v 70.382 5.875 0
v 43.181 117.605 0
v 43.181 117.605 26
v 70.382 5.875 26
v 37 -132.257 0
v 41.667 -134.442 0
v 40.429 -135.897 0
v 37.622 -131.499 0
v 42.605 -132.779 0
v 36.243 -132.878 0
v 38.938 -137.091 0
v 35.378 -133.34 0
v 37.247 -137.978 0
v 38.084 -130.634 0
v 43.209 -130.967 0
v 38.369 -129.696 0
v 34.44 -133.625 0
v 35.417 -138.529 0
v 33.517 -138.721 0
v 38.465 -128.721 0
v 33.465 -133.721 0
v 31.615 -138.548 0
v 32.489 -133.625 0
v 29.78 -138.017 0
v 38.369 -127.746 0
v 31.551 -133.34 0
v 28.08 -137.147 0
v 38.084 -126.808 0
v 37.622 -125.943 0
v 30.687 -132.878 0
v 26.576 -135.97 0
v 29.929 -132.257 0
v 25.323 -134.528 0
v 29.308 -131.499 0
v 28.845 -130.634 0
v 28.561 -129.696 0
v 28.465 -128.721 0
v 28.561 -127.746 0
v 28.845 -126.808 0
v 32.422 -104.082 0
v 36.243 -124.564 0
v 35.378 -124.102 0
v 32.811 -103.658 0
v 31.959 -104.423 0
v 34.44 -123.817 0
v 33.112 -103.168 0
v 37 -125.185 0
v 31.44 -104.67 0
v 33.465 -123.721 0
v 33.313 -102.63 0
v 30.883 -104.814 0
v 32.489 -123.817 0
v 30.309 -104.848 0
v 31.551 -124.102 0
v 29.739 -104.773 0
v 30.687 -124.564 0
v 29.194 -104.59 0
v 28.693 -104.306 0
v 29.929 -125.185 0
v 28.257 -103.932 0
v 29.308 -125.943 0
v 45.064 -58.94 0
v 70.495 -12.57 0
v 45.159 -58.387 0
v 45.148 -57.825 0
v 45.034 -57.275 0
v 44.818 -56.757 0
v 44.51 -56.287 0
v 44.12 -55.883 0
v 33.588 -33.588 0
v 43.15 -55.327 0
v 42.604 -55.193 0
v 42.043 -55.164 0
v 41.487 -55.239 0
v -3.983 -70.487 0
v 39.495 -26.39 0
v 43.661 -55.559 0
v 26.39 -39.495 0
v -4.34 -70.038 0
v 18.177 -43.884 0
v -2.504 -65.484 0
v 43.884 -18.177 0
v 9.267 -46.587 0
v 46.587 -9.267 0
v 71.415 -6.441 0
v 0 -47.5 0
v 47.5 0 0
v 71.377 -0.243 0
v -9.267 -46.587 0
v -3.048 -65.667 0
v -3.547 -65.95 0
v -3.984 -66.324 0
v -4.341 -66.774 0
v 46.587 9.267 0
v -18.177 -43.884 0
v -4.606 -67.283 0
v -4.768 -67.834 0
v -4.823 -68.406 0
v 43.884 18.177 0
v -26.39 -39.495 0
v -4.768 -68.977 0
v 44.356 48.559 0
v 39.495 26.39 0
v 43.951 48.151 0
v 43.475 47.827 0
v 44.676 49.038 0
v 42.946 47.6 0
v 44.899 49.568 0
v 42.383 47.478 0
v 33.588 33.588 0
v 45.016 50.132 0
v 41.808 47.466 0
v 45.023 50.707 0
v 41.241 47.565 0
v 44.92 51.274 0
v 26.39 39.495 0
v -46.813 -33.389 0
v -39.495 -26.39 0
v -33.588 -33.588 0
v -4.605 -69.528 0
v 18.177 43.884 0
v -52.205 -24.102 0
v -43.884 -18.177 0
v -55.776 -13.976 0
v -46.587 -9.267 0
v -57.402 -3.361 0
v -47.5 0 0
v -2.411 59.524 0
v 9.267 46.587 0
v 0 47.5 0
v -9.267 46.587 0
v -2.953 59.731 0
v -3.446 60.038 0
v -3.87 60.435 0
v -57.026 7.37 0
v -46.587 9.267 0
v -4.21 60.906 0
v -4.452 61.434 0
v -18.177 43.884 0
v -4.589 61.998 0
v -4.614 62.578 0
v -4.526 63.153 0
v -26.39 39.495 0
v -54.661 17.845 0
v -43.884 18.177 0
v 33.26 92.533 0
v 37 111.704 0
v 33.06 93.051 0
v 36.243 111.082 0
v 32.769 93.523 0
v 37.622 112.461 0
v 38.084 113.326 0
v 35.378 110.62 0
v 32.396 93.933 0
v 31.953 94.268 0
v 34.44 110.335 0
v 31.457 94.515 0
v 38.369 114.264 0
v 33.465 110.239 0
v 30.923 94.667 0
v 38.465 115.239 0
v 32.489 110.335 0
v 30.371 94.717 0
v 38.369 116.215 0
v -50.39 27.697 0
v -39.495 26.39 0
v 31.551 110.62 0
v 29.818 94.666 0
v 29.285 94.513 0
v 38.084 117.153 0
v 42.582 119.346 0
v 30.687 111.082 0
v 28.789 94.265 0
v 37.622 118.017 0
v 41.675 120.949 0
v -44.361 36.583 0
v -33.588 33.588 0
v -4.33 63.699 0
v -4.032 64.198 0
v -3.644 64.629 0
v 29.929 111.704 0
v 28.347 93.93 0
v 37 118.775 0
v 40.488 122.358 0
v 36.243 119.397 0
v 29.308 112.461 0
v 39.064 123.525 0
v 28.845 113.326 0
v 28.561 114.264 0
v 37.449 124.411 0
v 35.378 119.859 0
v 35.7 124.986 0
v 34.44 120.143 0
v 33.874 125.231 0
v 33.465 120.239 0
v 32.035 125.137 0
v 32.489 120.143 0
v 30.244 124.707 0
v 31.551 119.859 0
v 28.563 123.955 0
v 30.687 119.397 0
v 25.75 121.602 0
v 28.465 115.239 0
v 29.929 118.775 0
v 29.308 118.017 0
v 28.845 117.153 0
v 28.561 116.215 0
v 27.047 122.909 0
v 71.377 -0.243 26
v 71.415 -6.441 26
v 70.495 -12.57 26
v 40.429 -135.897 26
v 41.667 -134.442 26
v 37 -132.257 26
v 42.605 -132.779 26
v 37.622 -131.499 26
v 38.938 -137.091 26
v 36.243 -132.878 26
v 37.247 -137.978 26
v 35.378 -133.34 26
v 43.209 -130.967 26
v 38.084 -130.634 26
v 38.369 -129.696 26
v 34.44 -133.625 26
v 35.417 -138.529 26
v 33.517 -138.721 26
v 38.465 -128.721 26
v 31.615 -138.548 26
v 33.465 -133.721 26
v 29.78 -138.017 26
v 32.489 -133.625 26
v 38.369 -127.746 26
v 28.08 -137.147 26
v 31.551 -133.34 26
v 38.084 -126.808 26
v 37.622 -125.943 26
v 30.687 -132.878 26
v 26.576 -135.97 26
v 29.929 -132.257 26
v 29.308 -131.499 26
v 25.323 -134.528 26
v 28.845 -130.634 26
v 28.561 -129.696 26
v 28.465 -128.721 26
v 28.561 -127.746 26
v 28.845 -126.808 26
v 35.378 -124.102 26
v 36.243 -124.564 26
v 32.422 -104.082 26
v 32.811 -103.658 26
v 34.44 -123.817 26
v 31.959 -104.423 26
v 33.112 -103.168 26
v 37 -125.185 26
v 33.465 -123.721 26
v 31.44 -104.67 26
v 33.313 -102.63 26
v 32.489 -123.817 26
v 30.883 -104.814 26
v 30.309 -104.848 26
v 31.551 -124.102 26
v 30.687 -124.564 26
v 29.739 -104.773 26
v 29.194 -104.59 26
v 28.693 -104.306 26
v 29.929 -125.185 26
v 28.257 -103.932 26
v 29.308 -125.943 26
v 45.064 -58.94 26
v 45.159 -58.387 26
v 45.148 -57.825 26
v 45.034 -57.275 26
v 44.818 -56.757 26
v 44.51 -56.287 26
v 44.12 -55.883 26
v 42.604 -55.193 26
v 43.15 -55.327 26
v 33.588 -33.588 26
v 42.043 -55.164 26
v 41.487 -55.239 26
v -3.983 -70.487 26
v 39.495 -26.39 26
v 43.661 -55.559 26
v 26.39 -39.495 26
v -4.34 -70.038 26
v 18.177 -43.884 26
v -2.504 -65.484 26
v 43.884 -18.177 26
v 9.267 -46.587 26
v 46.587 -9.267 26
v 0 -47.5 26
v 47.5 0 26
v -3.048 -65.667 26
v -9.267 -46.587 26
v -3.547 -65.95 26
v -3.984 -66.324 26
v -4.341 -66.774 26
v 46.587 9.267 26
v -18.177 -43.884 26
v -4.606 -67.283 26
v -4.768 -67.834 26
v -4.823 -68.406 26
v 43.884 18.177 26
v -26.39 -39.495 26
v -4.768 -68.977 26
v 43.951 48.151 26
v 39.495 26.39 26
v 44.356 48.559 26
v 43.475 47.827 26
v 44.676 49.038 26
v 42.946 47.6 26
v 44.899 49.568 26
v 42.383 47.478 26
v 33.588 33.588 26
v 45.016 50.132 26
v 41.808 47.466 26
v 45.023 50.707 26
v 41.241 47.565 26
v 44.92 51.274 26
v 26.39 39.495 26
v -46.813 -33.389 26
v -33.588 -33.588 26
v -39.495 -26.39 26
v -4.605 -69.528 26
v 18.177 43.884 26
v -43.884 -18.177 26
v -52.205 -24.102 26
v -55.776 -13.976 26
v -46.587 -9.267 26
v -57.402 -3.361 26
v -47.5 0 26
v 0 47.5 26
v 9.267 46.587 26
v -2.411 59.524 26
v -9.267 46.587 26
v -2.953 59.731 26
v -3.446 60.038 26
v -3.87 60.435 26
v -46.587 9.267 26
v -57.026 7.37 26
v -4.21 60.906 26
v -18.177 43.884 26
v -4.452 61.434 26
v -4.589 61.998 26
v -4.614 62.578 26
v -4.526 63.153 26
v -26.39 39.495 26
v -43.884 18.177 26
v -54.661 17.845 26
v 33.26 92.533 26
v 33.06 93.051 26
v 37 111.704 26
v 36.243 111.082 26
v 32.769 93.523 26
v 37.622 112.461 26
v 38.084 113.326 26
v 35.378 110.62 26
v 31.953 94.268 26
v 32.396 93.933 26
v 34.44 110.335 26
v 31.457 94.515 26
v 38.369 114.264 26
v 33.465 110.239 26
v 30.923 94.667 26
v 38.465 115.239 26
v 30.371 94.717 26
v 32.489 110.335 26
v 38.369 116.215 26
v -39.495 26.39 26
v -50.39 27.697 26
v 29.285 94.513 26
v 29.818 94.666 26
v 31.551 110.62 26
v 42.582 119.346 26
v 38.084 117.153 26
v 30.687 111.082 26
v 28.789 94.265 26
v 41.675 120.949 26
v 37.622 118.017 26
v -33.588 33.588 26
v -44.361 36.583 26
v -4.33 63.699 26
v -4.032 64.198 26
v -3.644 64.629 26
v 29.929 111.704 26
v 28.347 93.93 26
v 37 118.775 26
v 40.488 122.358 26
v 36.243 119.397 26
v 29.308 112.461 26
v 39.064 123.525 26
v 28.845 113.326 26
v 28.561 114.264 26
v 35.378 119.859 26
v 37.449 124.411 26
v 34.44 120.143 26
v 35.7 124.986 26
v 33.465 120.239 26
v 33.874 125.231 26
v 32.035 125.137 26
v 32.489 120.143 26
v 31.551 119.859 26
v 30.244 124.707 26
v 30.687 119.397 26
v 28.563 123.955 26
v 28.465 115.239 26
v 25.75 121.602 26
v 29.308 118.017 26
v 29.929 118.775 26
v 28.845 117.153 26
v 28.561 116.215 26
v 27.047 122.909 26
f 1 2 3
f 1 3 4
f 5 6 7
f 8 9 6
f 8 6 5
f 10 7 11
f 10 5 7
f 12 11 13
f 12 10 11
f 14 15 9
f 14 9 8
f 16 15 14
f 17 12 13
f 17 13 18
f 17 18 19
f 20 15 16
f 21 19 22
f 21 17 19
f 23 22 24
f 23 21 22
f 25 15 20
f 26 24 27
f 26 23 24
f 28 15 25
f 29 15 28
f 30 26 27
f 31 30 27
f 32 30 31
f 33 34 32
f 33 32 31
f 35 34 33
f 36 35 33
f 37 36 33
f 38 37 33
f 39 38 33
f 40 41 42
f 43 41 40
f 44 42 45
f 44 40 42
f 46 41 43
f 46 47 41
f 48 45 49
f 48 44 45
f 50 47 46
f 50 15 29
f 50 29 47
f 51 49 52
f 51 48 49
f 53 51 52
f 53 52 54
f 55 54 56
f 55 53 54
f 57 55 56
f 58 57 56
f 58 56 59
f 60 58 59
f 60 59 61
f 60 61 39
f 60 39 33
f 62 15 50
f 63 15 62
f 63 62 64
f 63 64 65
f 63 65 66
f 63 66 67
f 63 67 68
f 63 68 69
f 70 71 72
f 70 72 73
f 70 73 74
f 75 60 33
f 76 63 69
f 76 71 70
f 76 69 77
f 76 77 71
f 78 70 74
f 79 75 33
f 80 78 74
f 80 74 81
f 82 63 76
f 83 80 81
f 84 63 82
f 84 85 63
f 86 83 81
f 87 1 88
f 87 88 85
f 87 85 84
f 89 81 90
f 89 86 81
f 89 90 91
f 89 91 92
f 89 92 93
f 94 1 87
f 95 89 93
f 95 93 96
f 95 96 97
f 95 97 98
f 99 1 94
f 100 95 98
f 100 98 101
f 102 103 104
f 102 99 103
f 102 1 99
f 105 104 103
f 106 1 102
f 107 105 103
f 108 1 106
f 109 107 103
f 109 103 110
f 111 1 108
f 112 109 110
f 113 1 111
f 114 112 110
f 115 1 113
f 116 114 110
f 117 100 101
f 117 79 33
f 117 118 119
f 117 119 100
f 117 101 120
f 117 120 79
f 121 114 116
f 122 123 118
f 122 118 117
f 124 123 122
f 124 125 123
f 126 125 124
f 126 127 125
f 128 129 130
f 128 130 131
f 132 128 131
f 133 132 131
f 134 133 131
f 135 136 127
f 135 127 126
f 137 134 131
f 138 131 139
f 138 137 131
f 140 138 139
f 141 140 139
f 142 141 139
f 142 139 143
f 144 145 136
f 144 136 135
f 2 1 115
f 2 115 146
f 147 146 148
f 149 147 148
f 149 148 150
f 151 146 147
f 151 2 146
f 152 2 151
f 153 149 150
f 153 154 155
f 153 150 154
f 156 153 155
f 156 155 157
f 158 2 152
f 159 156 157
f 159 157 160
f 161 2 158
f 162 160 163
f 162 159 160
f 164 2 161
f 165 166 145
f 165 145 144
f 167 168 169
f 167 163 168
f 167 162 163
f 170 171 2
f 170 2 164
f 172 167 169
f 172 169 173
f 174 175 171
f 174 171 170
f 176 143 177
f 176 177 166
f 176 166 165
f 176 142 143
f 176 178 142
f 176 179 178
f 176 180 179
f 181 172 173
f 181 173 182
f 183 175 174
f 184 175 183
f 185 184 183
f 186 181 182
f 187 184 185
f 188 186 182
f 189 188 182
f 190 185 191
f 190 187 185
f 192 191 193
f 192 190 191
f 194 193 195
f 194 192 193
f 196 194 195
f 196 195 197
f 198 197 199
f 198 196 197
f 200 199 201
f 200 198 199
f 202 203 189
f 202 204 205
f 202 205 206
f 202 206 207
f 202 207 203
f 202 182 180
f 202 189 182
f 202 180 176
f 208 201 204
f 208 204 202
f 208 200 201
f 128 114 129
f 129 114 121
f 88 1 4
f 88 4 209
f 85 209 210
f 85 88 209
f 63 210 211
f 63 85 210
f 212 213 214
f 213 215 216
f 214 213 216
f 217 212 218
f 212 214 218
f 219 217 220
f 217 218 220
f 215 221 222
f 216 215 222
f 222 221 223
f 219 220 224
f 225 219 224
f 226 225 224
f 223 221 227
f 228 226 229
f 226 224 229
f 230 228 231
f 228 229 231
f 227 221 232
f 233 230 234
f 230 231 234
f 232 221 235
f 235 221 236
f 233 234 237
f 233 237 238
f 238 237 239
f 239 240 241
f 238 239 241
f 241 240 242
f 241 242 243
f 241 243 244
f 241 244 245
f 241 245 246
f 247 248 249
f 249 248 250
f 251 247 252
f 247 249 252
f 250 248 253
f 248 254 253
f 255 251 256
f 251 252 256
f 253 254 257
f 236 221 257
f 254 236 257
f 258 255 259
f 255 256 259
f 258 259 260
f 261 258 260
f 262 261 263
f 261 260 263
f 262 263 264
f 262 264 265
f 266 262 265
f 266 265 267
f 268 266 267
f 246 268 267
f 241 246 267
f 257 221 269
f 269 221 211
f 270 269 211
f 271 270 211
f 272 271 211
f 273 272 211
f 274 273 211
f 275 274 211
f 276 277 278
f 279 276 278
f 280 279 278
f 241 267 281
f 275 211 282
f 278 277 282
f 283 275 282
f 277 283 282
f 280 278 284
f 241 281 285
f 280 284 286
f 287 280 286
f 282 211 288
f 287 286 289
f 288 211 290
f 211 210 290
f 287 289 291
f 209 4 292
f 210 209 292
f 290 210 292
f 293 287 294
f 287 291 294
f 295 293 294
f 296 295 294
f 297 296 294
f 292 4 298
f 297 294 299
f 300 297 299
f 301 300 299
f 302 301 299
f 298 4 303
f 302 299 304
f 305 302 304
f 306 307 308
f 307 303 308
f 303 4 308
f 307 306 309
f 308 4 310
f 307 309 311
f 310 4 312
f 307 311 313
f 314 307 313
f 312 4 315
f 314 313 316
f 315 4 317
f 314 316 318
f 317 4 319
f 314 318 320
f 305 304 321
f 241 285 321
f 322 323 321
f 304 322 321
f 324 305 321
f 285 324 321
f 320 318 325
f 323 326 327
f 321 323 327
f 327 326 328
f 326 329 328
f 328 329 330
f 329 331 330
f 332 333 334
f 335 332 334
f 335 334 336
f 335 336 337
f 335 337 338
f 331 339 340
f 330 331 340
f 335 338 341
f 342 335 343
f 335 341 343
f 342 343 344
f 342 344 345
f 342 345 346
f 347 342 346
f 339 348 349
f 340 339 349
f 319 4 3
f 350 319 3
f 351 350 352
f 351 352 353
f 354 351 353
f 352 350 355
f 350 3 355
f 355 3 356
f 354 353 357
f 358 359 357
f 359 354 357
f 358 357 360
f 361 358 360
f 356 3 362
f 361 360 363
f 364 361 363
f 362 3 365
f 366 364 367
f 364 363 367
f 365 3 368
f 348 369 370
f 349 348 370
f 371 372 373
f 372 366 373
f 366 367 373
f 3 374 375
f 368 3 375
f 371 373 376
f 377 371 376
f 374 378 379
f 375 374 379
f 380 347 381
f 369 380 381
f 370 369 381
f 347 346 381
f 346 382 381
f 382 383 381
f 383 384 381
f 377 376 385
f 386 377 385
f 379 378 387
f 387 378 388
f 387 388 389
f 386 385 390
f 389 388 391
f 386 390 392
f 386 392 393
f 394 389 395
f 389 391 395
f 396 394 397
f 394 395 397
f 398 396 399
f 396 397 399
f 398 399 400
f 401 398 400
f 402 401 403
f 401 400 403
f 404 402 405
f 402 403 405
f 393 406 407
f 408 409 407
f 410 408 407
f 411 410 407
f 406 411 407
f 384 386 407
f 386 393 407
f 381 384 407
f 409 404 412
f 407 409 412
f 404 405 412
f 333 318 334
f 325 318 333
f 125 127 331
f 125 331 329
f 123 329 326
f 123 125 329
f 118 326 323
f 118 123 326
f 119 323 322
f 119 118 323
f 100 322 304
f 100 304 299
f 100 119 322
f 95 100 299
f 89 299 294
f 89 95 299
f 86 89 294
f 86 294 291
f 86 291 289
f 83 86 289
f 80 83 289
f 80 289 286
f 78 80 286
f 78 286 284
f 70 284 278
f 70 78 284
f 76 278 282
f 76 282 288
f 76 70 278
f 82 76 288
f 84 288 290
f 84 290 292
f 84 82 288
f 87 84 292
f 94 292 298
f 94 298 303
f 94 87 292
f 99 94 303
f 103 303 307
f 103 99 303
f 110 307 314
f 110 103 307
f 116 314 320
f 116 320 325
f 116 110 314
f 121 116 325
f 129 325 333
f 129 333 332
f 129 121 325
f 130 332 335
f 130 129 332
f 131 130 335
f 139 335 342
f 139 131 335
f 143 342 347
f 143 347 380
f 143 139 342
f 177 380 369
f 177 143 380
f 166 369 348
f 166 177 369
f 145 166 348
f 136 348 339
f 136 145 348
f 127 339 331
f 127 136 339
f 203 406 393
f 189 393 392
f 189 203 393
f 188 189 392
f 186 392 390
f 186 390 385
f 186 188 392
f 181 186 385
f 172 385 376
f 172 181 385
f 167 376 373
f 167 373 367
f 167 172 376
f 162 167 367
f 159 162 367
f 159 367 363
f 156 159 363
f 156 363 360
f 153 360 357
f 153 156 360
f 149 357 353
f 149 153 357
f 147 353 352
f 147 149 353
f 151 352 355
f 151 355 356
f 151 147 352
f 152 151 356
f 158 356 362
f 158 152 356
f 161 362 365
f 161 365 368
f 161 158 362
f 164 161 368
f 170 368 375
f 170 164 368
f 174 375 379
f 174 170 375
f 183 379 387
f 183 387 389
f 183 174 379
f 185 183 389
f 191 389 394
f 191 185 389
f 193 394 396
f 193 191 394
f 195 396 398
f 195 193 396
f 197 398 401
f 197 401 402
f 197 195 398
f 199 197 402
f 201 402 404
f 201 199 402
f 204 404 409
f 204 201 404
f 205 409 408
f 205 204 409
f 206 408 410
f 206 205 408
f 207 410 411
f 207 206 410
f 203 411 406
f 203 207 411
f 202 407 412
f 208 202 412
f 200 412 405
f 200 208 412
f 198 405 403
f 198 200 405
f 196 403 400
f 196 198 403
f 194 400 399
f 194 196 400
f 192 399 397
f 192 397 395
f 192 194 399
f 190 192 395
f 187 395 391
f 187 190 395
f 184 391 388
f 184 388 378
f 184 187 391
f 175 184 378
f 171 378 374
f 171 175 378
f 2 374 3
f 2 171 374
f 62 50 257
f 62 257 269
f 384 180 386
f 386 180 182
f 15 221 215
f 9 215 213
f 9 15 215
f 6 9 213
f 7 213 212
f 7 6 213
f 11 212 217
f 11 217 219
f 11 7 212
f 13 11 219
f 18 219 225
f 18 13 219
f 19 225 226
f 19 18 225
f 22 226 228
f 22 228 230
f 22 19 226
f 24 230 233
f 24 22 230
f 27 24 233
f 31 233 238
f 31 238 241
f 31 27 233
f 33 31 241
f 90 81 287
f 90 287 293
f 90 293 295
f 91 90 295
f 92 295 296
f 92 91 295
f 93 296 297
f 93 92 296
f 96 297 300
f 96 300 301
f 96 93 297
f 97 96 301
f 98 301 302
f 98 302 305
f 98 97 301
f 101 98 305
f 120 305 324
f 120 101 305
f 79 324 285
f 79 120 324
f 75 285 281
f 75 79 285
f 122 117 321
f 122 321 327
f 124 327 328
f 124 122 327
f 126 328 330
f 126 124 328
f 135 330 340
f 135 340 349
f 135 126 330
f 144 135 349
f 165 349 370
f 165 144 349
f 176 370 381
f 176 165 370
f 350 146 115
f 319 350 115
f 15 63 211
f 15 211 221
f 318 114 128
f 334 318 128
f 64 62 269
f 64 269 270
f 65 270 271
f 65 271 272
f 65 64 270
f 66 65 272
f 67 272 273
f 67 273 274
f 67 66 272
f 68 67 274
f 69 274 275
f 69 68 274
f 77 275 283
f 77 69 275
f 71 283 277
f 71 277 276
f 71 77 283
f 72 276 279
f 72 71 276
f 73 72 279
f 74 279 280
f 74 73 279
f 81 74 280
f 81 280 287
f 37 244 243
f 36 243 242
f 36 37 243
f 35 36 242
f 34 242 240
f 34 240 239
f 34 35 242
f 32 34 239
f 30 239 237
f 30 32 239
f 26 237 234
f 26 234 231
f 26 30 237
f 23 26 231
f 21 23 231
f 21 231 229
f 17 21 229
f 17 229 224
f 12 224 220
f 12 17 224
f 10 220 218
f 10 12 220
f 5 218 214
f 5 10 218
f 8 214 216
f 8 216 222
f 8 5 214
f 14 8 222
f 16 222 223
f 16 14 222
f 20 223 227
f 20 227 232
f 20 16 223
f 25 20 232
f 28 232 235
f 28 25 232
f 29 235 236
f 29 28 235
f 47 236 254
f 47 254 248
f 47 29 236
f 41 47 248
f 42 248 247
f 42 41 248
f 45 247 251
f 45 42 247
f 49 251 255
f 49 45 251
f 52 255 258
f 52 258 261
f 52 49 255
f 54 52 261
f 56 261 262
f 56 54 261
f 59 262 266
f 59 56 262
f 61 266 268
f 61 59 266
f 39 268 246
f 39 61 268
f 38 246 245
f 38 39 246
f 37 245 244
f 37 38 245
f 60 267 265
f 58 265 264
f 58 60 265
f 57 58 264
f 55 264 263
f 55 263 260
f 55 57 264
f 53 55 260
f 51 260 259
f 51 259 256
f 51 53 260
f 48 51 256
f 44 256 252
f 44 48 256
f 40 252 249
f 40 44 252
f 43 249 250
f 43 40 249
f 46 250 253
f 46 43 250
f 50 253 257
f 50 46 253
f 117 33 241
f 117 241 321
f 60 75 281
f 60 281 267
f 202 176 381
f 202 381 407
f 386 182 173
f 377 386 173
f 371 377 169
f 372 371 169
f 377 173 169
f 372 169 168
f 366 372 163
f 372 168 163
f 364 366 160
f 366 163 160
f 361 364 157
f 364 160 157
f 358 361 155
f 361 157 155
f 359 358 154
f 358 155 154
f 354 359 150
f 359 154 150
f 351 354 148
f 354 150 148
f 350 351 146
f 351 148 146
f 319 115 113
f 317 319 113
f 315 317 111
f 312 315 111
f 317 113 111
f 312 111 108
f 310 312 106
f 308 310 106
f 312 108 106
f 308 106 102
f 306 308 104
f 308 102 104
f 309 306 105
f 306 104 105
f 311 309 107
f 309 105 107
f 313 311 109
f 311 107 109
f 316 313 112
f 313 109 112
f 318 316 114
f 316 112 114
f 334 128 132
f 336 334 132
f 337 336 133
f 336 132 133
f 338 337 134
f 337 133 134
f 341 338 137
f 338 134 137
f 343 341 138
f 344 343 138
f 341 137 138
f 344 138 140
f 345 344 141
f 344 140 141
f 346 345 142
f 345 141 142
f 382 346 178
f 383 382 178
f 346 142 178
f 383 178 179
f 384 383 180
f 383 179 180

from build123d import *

# Parameters (mm, degrees)
SKETCH2_R           = 47.5
SKETCH2_R_2         = 5
BOSS_EXTRUDE2_DEPTH = 26
CUT_EXTRUDE1_DEPTH  = 26


with BuildPart() as part:
    # Sketch2 → Boss-Extrude2 (new body)
    with BuildSketch(Plane.XY):
        with BuildLine():
            Line((-44.361418341, 36.582981874), (25.749824557, 121.601589362))
            ThreePointArc((25.749824557, 121.601589362), (35.699764064, 124.986391522), (43.181062365, 117.604768557))
            Line((43.181062365, 117.604768557), (70.382008245, 5.874854744))
            ThreePointArc((70.382008245, 5.874854744), (71.516417726, -3.340902868), (70.495441136, -12.569915818))
            Line((70.495441136, -12.569915818), (43.209420588, -130.966785703))
            ThreePointArc((43.209420588, -130.966785703), (35.417472002, -138.528541499), (25.323491774, -134.527769491))
            Line((25.323491774, -134.527769491), (-46.812831844, -33.388752219))
            ThreePointArc((-46.812831844, -33.388752219), (-57.464744559, 2.013239383), (-44.361418341, 36.582981874))
        make_face()
        with Locations(Location((0, 0, 0), (0, 0, 180))):
            Circle(SKETCH2_R, mode=Mode.SUBTRACT)
        with Locations(Location((33.464853834, 115.239331644, 0), (0, 0, 180))):
            Circle(SKETCH2_R_2, mode=Mode.SUBTRACT)
        with Locations(Location((33.464853834, -128.721029975, 0), (0, 0, 180))):
            Circle(SKETCH2_R_2, mode=Mode.SUBTRACT)
    extrude(amount=BOSS_EXTRUDE2_DEPTH)

    # Sketch3 → Cut-Extrude1 (cut)
    with BuildSketch(Plane(origin=(0, 0, 0), x_dir=(-1, 0, 0), z_dir=(0, 0, -1))):
        with BuildLine():
            Line((-33.26004361, 92.533263855), (-44.920341747, 51.273747369))
            ThreePointArc((-44.920341747, 51.273747369), (-44.16321834, 48.345074539), (-41.240708097, 47.564501493))
            Line((-41.240708097, 47.564501493), (2.410664417, 59.523781634))
            ThreePointArc((2.410664417, 59.523781634), (4.534059271, 61.712628945), (3.644196413, 64.629476961))
            Line((3.644196413, 64.629476961), (-28.346877964, 93.929713306))
            ThreePointArc((-28.346877964, 93.929713306), (-31.193307402, 94.603096407), (-33.26004361, 92.533263855))
        make_face()
        with BuildLine():
            Line((-41.486917876, -55.239236277), (2.503698589, -65.483626413))
            ThreePointArc((2.503698589, -65.483626413), (4.700165382, -67.55485567), (3.983155181, -70.48749158))
            Line((3.983155181, -70.48749158), (-28.256543188, -103.932412317))
            ThreePointArc((-28.256543188, -103.932412317), (-31.16488904, -104.755498955), (-33.313463379, -102.629569624))
            Line((-33.313463379, -102.629569624), (-45.064381475, -58.940258751))
            ThreePointArc((-45.064381475, -58.940258751), (-44.32436227, -56.076046257), (-41.486917876, -55.239236277))
        make_face()
    extrude(amount=-CUT_EXTRUDE1_DEPTH, mode=Mode.SUBTRACT)


solid = part.part
